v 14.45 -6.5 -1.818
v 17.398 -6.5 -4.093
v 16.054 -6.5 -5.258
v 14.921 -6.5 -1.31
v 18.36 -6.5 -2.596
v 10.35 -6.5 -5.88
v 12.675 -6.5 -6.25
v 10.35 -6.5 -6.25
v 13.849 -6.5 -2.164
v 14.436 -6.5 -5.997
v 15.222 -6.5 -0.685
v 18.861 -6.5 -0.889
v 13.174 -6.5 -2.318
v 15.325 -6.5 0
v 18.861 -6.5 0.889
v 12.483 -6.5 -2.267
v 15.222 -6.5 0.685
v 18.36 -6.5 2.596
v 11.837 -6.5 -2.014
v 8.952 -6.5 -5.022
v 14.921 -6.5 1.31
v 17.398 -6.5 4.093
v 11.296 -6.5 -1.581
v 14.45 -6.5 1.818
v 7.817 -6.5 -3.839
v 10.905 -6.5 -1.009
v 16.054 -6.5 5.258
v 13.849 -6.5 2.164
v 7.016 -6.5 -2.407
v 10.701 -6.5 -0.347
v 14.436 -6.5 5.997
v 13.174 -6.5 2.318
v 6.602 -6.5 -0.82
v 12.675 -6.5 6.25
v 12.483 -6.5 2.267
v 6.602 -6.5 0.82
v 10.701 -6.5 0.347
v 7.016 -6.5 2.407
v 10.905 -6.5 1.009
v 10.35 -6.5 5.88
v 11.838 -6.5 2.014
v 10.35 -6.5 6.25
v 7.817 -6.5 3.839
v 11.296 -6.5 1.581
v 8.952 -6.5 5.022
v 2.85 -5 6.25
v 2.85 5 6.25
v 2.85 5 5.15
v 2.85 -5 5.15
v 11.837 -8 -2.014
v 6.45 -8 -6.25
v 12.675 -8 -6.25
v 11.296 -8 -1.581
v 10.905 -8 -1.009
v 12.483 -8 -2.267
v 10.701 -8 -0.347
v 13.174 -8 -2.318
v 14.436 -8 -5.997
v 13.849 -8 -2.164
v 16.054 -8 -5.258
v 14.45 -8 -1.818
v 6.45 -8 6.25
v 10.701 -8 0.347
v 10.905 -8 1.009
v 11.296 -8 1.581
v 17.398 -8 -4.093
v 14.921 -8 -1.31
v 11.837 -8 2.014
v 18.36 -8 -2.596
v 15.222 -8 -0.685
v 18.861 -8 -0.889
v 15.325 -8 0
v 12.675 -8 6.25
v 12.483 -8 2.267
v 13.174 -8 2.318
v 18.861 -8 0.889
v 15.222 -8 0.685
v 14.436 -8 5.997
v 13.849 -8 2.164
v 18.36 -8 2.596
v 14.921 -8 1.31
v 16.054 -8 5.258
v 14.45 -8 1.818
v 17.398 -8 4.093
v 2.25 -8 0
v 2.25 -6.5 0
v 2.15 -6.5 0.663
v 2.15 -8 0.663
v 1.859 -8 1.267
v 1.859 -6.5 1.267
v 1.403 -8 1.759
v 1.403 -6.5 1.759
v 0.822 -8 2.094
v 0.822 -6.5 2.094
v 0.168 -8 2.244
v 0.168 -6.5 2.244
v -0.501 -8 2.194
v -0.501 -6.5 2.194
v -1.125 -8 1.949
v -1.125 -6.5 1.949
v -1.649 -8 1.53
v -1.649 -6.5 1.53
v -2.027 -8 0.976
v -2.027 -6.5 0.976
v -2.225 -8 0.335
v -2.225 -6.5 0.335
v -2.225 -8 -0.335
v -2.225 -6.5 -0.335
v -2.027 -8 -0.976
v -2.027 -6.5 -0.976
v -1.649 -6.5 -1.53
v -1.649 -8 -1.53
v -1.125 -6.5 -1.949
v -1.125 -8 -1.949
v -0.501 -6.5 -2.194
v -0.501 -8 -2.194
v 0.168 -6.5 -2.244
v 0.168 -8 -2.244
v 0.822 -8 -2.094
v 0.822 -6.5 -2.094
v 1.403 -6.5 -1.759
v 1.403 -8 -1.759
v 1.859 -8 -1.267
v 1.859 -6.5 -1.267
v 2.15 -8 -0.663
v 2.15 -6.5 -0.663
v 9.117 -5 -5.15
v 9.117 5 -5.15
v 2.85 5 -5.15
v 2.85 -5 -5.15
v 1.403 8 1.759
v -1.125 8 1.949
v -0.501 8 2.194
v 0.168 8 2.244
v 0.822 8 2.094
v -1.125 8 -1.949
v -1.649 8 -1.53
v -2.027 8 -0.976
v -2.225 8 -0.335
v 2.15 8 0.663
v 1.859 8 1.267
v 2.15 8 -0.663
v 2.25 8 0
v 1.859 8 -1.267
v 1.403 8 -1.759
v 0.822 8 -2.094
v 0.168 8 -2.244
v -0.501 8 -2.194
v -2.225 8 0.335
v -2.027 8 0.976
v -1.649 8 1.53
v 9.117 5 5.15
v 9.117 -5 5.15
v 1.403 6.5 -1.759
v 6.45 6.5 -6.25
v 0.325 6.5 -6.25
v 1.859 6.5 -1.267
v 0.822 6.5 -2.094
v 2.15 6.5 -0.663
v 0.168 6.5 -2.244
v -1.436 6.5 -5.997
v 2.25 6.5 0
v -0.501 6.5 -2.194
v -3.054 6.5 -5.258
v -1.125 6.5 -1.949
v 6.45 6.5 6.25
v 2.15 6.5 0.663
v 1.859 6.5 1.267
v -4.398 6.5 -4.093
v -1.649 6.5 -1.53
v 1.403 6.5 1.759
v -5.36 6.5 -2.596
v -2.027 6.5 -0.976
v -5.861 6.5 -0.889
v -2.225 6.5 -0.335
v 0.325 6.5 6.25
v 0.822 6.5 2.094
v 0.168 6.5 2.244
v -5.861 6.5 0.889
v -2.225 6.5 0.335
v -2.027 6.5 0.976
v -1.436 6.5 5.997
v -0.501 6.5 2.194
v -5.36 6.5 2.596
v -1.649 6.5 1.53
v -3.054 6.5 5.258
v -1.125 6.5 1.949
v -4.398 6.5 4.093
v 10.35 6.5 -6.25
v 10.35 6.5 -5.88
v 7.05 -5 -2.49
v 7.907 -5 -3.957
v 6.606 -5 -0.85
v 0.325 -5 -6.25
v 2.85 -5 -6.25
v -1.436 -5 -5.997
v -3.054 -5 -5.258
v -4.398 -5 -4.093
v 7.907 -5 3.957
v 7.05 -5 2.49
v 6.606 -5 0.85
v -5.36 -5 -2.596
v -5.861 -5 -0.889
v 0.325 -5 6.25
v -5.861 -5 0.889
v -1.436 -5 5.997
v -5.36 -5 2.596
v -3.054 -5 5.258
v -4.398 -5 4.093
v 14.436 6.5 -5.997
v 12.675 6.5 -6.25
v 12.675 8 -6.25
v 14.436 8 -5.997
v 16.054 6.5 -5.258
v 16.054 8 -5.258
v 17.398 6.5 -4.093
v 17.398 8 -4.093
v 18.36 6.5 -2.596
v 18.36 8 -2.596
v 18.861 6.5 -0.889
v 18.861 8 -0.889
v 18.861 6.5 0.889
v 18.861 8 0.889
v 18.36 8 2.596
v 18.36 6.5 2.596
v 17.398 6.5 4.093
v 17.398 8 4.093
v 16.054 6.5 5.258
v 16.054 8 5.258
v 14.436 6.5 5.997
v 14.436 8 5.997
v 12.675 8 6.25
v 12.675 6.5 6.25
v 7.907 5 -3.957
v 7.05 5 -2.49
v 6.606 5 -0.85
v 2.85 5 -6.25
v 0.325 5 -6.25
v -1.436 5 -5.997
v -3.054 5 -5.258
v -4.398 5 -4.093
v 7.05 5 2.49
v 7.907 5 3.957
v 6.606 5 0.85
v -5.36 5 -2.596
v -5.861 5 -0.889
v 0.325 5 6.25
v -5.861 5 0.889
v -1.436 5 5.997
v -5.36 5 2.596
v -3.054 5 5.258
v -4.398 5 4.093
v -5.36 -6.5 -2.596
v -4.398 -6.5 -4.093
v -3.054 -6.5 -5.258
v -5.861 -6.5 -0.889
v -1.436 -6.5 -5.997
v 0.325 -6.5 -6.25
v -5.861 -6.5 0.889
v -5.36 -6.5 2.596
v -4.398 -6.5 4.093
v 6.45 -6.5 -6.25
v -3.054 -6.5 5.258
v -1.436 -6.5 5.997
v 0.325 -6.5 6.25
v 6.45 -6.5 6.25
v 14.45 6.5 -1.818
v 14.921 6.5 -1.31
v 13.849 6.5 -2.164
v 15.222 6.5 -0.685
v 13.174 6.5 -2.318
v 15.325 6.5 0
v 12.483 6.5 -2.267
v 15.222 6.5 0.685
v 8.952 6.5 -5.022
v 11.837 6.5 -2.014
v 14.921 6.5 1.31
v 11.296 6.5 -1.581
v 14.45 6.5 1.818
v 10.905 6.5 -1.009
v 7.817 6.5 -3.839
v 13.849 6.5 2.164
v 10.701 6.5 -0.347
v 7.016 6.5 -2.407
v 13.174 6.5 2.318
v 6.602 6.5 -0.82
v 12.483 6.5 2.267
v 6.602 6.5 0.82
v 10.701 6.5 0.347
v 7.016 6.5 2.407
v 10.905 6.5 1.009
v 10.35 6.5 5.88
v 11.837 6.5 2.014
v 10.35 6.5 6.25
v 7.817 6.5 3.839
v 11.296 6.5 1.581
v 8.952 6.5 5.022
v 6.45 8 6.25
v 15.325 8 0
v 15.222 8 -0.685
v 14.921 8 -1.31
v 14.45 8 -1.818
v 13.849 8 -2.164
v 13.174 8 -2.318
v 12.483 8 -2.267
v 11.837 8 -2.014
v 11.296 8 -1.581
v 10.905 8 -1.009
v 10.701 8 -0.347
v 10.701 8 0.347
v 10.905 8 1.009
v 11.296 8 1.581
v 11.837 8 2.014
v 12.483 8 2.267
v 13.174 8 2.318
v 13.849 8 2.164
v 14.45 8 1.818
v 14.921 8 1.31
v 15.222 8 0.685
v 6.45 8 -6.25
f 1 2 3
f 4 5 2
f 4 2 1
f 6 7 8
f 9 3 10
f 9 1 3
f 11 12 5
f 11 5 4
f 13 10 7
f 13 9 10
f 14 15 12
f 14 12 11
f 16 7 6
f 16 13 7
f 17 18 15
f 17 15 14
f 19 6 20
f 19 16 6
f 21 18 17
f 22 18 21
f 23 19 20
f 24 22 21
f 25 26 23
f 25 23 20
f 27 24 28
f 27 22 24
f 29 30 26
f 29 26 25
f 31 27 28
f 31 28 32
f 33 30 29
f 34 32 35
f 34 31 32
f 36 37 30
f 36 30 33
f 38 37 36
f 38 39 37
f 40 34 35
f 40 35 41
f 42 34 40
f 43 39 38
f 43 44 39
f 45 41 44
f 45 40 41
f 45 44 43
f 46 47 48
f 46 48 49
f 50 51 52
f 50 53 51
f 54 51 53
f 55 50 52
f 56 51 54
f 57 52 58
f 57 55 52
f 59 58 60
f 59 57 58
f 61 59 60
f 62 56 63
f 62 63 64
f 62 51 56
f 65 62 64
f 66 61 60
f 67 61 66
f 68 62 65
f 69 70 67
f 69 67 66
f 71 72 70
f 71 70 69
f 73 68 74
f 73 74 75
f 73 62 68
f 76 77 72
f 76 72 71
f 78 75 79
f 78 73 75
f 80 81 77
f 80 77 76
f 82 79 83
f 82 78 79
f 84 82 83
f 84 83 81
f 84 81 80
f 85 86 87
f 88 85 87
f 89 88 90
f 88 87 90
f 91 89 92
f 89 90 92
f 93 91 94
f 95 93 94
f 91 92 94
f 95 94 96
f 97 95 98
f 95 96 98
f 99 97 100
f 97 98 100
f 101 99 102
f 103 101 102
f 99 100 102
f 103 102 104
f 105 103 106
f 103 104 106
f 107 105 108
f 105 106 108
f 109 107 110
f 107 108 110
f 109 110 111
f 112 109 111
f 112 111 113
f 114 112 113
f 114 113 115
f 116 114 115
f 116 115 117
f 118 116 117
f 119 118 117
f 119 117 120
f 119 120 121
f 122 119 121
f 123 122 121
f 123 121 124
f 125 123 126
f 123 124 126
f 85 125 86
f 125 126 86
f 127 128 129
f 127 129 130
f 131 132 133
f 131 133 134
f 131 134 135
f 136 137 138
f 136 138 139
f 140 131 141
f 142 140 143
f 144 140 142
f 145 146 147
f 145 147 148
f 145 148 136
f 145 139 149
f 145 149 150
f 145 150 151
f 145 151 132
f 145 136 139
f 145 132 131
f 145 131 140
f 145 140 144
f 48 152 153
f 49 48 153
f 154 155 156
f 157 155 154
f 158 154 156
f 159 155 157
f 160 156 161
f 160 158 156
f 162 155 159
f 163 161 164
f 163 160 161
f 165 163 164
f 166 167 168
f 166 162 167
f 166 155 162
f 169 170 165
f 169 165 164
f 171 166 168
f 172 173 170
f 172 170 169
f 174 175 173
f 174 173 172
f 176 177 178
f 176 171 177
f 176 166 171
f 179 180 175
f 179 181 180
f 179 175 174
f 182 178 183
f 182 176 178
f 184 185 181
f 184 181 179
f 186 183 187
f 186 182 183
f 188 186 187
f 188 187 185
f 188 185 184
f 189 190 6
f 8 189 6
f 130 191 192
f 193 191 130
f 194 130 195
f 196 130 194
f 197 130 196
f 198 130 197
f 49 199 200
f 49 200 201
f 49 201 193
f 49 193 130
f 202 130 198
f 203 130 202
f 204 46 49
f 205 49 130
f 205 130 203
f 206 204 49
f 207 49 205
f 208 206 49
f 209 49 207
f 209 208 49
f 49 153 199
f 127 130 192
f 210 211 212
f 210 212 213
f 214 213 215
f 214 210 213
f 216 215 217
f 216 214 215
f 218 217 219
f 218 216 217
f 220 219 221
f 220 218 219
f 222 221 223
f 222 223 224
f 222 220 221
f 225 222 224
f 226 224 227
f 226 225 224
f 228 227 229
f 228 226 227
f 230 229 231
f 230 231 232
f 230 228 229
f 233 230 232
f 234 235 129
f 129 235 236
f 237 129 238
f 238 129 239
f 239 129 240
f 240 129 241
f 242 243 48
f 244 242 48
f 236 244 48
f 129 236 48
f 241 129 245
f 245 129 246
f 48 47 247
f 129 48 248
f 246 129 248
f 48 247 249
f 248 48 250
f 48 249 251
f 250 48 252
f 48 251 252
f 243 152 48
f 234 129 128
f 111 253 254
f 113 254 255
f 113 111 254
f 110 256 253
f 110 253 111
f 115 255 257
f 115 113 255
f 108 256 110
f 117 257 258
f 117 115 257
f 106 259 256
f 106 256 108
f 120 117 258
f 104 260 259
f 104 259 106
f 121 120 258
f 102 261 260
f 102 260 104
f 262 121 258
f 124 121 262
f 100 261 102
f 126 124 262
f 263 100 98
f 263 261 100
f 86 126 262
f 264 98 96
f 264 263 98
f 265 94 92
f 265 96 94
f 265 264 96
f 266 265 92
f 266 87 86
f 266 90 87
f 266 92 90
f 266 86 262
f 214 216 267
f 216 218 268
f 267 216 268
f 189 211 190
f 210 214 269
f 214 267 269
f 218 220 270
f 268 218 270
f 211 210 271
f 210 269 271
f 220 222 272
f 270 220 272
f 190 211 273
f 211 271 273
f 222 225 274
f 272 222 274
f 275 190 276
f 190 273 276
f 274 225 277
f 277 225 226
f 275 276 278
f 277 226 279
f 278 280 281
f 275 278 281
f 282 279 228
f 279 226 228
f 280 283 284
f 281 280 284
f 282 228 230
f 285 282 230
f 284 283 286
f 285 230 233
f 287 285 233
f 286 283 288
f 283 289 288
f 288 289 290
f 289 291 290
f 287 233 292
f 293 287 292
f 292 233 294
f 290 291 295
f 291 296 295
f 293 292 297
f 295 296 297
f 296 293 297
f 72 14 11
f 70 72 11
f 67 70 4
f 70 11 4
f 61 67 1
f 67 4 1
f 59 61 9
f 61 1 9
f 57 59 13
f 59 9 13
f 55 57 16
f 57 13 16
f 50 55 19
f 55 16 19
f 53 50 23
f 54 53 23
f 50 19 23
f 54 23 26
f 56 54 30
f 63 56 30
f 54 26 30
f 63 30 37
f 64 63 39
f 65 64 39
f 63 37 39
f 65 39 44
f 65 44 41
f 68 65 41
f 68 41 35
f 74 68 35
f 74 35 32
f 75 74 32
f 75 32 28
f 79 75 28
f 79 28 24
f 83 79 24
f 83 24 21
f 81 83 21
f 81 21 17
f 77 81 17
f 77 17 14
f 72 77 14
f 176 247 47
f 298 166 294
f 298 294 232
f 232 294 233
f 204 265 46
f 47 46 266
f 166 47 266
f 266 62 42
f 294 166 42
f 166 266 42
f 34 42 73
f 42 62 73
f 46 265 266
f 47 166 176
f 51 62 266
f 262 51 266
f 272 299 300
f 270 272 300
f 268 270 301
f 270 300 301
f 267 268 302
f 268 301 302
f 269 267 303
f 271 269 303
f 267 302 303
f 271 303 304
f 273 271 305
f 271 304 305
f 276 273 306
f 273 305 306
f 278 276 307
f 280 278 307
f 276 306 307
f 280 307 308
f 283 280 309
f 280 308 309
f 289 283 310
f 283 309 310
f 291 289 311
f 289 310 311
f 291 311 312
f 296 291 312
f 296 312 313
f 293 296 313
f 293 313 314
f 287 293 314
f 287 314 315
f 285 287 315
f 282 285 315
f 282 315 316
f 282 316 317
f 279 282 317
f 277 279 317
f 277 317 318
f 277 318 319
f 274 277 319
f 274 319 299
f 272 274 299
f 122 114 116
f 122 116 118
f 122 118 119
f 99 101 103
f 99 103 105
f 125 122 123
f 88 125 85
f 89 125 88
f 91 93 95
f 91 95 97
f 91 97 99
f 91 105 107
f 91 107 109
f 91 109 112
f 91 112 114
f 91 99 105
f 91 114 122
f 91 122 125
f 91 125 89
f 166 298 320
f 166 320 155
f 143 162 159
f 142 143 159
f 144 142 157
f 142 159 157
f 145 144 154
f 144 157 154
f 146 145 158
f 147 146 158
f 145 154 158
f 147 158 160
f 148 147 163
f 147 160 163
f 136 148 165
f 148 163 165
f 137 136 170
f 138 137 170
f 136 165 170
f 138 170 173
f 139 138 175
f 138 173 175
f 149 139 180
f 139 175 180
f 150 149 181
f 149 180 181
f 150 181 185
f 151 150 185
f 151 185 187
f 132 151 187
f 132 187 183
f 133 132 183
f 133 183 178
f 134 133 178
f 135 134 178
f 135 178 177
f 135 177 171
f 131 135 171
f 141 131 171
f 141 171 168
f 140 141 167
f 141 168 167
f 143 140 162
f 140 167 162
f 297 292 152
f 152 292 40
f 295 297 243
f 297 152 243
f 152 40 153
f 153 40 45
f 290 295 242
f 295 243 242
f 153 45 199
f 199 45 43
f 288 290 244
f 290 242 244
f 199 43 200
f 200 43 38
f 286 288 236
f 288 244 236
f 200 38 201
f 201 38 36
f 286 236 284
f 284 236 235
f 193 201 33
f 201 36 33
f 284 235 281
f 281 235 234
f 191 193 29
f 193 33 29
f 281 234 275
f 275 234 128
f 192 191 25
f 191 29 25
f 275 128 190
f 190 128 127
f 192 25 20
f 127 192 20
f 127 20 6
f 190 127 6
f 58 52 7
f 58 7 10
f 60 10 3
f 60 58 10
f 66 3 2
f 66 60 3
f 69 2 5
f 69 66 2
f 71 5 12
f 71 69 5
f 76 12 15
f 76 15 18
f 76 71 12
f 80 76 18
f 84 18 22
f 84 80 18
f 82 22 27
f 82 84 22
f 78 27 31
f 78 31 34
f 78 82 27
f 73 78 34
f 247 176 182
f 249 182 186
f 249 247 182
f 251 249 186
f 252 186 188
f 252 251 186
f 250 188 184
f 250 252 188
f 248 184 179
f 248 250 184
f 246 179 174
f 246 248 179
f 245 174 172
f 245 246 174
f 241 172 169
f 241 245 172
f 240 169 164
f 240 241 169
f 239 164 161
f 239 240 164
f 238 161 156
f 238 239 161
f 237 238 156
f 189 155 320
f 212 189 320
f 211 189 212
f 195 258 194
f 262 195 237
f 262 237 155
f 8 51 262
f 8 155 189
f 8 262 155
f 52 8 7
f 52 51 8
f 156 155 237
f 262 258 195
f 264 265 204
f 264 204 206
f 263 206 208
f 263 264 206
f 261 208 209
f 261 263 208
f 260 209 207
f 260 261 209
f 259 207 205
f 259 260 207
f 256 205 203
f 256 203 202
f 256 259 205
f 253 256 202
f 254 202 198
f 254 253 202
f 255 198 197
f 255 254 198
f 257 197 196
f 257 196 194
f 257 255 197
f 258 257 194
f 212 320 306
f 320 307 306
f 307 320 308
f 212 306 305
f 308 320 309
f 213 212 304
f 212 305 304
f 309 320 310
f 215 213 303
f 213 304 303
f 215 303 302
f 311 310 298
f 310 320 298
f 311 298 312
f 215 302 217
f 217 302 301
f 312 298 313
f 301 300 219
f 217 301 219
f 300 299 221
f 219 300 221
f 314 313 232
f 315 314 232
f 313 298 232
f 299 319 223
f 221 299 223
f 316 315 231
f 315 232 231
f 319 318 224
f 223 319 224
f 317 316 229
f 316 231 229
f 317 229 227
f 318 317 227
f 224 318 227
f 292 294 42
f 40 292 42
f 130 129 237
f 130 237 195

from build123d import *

# Parameters (mm, degrees)
PAD001005_DEPTH = 6.5
PAD001007_DEPTH = 8
SKETCH034_W     = 16
SKETCH034_H     = 2.5
POCKET024_DEPTH = 12.501
SKETCH036_W     = 10
SKETCH036_H     = 10
POCKET025_DEPTH = 12.501
SKETCH035_W     = 13
SKETCH035_H     = 13
POCKET026_DEPTH = 12.501
SKETCH033_R     = 2.25
PAD001006_DEPTH = 1.5
SKETCH032_R     = 2.25
PAD001004_DEPTH = 1.5
SKETCH006_R     = 2.325
POCKET023_DEPTH = 16.001
SKETCH030_W     = 10.3
SKETCH030_H     = 10
POCKET022_DEPTH = 16.276


with BuildPart() as inner_room_male:
    # Sketch029 → Pad001005 (new body, symmetric)
    with BuildSketch(Plane.XZ):
        with BuildLine():
            ThreePointArc((13, 6.45), (6.55, 0), (13, -6.45))
            Line((13, 6.45), (13, -6.45))
        make_face()
    extrude(amount=PAD001005_DEPTH, both=True)


with BuildPart() as cable_chain_link:
    # Sketch031 → Pad001007 (new body, symmetric)
    with BuildSketch(Plane.XZ):
        with BuildLine():
            ThreePointArc((0.325, 6.25), (-5.925, 0), (0.325, -6.25))
            Line((0.325, -6.25), (12.675, -6.25))
            ThreePointArc((12.675, -6.25), (18.925, 0), (12.675, 6.25))
            Line((0.325, 6.25), (12.675, 6.25))
        make_face()
    extrude(amount=PAD001007_DEPTH, both=True)

    # Sketch034 (on Face4 of Pad001007) → Pocket024 (cut, through all)
    with BuildSketch(Plane(origin=(0, 0, 6.25), x_dir=(-1, 0, 0), z_dir=(0, 0, 1))):
        Polygon((9.55, 8), (9.55, 6.5), (-6.45, 6.5), (-6.45, 8), (-6.45, 9), (9.55, 9), align=None)
        with Locations((1.55, -7.75)):
            Rectangle(SKETCH034_W, SKETCH034_H)
    extrude(amount=-POCKET024_DEPTH, mode=Mode.SUBTRACT)

    # Sketch036 (on Face5 of Pocket024) → Pocket025 (cut, through all)
    with BuildSketch(Plane(origin=(0, 0, 6.25), x_dir=(-1, 0, 0), z_dir=(0, 0, 1))):
        with Locations((2.15, 0)):
            Rectangle(SKETCH036_W, SKETCH036_H)
    extrude(amount=-POCKET025_DEPTH, mode=Mode.SUBTRACT)

    # Sketch035 (on Face4 of Pocket025) → Pocket026 (cut, through all)
    with BuildSketch(Plane(origin=(0, 0, 6.25), x_dir=(-1, 0, 0), z_dir=(0, 0, 1))):
        with Locations((-16.85, 0)):
            Rectangle(SKETCH035_W, SKETCH035_H)
    extrude(amount=-POCKET026_DEPTH, mode=Mode.SUBTRACT)

    # Sketch033 (on Face14 of Pocket026) → Pad001006 (new body)
    with BuildSketch(Plane.XZ.offset(6.5)):
        Circle(SKETCH033_R)
    extrude(amount=PAD001006_DEPTH)

    # Sketch032 (on Face5 of Pad001006) → Pad001004 (new body)
    with BuildSketch(Plane(origin=(0, 6.5, 0), x_dir=(1, 0, 0), z_dir=(0, 1, 0))):
        Circle(SKETCH032_R)
    extrude(amount=PAD001004_DEPTH)

    # Sketch006 (on Face6 of Pad001004) → Pocket023 (cut, through all)
    with BuildSketch(Plane(origin=(0, 8, 0), x_dir=(1, 0, 0), z_dir=(0, 1, 0))):
        with Locations((13, 0)):
            Circle(SKETCH006_R)
    extrude(amount=-POCKET023_DEPTH, mode=Mode.SUBTRACT)

    # Sketch030 (on Face9 of Pocket023) → Pocket022 (cut, through all)
    with BuildSketch(Plane(origin=(10.35, 0, 0), x_dir=(0, 0, 1), z_dir=(1, 0, 0))):
        Rectangle(SKETCH030_W, SKETCH030_H)
    extrude(amount=-POCKET022_DEPTH, mode=Mode.SUBTRACT)

    # Cut003003: cut inner-room-male
    add(inner_room_male.part, mode=Mode.SUBTRACT)


solid = cable_chain_link.part
